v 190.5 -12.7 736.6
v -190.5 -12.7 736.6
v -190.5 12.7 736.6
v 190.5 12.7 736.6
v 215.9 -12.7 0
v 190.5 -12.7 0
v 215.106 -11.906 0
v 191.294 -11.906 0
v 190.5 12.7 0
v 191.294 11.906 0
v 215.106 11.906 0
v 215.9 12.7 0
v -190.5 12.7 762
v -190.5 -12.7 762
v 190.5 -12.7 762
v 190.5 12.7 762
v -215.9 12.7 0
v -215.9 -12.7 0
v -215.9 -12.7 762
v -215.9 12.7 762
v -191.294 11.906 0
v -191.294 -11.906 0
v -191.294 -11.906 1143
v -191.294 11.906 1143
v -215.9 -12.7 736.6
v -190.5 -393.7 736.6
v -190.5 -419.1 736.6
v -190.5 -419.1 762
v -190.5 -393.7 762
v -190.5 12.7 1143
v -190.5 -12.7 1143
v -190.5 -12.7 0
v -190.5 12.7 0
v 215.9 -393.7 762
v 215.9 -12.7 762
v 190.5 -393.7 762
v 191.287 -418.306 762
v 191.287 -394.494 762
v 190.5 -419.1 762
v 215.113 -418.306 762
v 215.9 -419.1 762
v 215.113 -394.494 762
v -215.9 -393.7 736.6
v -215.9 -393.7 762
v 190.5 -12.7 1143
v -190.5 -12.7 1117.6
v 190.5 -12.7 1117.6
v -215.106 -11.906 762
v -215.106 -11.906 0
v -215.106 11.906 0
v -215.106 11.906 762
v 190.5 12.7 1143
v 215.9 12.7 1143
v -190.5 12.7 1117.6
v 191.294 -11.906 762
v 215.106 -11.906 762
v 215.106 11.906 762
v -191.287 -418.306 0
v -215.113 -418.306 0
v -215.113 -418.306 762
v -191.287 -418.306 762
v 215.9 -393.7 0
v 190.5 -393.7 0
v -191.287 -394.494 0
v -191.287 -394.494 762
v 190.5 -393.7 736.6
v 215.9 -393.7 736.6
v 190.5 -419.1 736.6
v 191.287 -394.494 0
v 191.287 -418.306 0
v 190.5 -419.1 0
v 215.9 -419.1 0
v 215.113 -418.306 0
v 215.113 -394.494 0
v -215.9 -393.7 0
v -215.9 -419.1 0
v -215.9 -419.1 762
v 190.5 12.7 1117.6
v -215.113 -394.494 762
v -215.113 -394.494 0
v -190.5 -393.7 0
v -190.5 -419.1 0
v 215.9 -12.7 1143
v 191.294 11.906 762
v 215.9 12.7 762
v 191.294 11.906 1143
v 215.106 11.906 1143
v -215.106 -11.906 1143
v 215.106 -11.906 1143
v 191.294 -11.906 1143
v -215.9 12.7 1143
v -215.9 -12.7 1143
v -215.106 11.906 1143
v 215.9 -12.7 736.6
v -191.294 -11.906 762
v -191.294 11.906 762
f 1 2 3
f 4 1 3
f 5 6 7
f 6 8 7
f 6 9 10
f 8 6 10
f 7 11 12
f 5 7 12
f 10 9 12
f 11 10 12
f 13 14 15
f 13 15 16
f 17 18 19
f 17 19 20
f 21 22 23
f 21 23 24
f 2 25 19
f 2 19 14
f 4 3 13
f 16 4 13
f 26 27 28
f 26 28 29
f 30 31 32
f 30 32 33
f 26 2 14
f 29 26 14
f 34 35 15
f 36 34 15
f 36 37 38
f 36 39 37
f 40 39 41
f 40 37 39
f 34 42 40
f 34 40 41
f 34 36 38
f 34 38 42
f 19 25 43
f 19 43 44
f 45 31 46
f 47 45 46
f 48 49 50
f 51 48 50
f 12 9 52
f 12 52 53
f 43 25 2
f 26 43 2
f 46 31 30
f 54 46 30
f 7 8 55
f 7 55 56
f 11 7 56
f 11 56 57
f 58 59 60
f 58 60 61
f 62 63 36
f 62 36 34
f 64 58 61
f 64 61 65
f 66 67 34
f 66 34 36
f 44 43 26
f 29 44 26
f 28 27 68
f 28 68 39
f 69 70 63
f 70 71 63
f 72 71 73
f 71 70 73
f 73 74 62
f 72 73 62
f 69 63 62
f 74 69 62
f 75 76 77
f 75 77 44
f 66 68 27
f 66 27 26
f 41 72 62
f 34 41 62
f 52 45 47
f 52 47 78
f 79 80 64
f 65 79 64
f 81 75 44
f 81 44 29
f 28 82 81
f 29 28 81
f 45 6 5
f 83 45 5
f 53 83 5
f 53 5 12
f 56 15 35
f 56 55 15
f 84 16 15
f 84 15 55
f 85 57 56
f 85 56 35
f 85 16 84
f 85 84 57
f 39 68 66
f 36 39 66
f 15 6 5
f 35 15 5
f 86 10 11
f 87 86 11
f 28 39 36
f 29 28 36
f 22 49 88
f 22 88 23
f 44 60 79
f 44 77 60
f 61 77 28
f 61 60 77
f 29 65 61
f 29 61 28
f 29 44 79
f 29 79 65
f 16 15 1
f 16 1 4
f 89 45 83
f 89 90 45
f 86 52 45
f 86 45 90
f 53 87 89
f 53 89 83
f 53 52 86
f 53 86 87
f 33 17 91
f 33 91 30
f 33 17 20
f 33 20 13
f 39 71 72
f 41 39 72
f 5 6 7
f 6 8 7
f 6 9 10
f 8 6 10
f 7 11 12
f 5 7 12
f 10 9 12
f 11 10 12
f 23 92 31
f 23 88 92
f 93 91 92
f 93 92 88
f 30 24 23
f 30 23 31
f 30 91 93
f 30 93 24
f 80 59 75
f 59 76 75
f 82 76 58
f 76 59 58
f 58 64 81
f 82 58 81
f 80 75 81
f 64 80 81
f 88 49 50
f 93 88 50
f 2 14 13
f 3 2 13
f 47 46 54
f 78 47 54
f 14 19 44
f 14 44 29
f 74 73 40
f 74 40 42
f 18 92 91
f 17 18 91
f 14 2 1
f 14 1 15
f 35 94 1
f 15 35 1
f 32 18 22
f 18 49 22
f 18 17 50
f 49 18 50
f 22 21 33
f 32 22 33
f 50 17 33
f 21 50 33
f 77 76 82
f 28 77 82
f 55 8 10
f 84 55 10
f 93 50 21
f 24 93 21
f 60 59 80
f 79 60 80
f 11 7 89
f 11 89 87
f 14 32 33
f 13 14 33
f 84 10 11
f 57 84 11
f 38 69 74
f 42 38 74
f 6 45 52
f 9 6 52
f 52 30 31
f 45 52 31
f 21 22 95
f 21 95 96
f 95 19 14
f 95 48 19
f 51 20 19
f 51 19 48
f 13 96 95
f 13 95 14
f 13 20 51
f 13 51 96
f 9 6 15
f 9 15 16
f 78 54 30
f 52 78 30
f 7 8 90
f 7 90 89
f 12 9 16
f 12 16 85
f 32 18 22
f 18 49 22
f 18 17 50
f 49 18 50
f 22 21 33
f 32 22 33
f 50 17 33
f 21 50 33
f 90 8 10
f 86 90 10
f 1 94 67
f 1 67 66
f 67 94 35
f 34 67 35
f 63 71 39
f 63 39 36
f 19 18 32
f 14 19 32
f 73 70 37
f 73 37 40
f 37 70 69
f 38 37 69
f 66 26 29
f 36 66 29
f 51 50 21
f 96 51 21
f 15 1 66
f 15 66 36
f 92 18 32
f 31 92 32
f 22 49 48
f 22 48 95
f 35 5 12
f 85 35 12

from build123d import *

# Parameters (mm, degrees)
F0_W      = 25.4
F0_H      = 25.4
F0_W_2    = 23.8125
F0_H_2    = 23.8125
F1_DEPTH  = 1143
F0_W_3    = 23.8252
F2_W      = 25.4
F2_H      = 25.4
F3_DEPTH  = 381
F7_DEPTH  = 762
F8_W      = 25.4
F8_H      = 25.4
F9_DEPTH  = 381
F10_W     = 25.4
F10_H     = 38.2154002551
F11_DEPTH = 381
F10_H_2   = 25.4
F14_DEPTH = 381


# Not quite as in the source:
# - the program builds the solid bodies; features that only make, move or delete a surface that nothing else refers to are left out


with BuildPart() as f1:
    # F0 (on Top) → F1 (new body)
    with BuildSketch(Plane.XY):
        with Locations((-203.2, 0)):
            Rectangle(F0_W, F0_H)
        with Locations((-203.2, 0)):
            Rectangle(F0_W_2, F0_H_2, mode=Mode.SUBTRACT)
    extrude(amount=F1_DEPTH)


with BuildPart() as f1b:
    # F0 (on Top) → F1, piece 2 (new body)
    with BuildSketch(Plane.XY):
        with Locations((203.2, 0)):
            Rectangle(F0_W, F0_H)
        with Locations((203.2, 0)):
            Rectangle(F0_W_2, F0_H_2, mode=Mode.SUBTRACT)
    extrude(amount=F1_DEPTH)


with BuildPart() as f1c:
    # F0 (on Top) → F1, piece 3 (new body)
    with BuildSketch(Plane.XY):
        with Locations((-203.2, -406.4)):
            Rectangle(F0_W, F0_H)
        with Locations((-203.2, -406.4)):
            Rectangle(F0_W_3, F0_H_2, mode=Mode.SUBTRACT)
    extrude(amount=F1_DEPTH)


with BuildPart() as f1d:
    # F0 (on Top) → F1, piece 4 (new body)
    with BuildSketch(Plane.XY):
        with Locations((203.2, -406.4)):
            Rectangle(F0_W, F0_H)
        with Locations((203.2, -406.4)):
            Rectangle(F0_W_3, F0_H_2, mode=Mode.SUBTRACT)
    extrude(amount=F1_DEPTH)


with BuildPart() as f3:
    # F2 (on face) → F3 (new body)
    with BuildSketch(Plane.XZ.offset(12.7)):
        with Locations((-203.2, 749.3)):
            Rectangle(F2_W, F2_H)
    extrude(amount=F3_DEPTH)


with BuildPart() as f4_1:
    # F4: instance of F3
    add(f3.part.mirror(Plane.YZ))


with BuildPart() as f7:
    # F0 (on Top) → F7 (new body)
    with BuildSketch(Plane.XY):
        with Locations((-203.2, 0)):
            Rectangle(F0_W, F0_H)
        with Locations((-203.2, 0)):
            Rectangle(F0_W_2, F0_H_2, mode=Mode.SUBTRACT)
    extrude(amount=F7_DEPTH)


with BuildPart() as f7b:
    # F0 (on Top) → F7, piece 2 (new body)
    with BuildSketch(Plane.XY):
        with Locations((203.2, 0)):
            Rectangle(F0_W, F0_H)
        with Locations((203.2, 0)):
            Rectangle(F0_W_2, F0_H_2, mode=Mode.SUBTRACT)
    extrude(amount=F7_DEPTH)


with BuildPart() as f7c:
    # F0 (on Top) → F7, piece 3 (new body)
    with BuildSketch(Plane.XY):
        with Locations((-203.2, -406.4)):
            Rectangle(F0_W, F0_H)
        with Locations((-203.2, -406.4)):
            Rectangle(F0_W_3, F0_H_2, mode=Mode.SUBTRACT)
    extrude(amount=F7_DEPTH)


with BuildPart() as f7d:
    # F0 (on Top) → F7, piece 4 (new body)
    with BuildSketch(Plane.XY):
        with Locations((203.2, -406.4)):
            Rectangle(F0_W, F0_H)
        with Locations((203.2, -406.4)):
            Rectangle(F0_W_3, F0_H_2, mode=Mode.SUBTRACT)
    extrude(amount=F7_DEPTH)


with BuildPart() as f9:
    # F8 (on face) → F9 (new body)
    with BuildSketch(Plane.YZ.offset(-190.5)):
        with Locations((-406.4, 749.3)):
            Rectangle(F8_W, F8_H)
    extrude(amount=F9_DEPTH)


with BuildPart() as f11:
    # F10 (on face) → F11 (new body)
    with BuildSketch(Plane.YZ.offset(-190.5)):
        with Locations((0, 1047.0973100239)):
            Rectangle(F10_W, F10_H)
    extrude(amount=F11_DEPTH)


with BuildPart() as f11b:
    # F10 (on face) → F11, piece 2 (new body)
    with BuildSketch(Plane.YZ.offset(-190.5)):
        with Locations((0, 749.3)):
            Rectangle(F10_W, F10_H_2)
    extrude(amount=F11_DEPTH)


with BuildPart() as f14:
    # F13 (on face) → F14 (new body)
    with BuildSketch(Plane.YZ.offset(-190.5)):
        Polygon((12.7, 1117.6), (12.7, 1143), (-12.7, 1143), (-12.7, 1117.6), (-11.1125, 1117.6), align=None)
    extrude(amount=F14_DEPTH)


solid = Compound([f1.part, f1b.part, f3.part, f4_1.part, f7.part, f7b.part, f7c.part, f7d.part, f9.part, f11b.part, f14.part])
